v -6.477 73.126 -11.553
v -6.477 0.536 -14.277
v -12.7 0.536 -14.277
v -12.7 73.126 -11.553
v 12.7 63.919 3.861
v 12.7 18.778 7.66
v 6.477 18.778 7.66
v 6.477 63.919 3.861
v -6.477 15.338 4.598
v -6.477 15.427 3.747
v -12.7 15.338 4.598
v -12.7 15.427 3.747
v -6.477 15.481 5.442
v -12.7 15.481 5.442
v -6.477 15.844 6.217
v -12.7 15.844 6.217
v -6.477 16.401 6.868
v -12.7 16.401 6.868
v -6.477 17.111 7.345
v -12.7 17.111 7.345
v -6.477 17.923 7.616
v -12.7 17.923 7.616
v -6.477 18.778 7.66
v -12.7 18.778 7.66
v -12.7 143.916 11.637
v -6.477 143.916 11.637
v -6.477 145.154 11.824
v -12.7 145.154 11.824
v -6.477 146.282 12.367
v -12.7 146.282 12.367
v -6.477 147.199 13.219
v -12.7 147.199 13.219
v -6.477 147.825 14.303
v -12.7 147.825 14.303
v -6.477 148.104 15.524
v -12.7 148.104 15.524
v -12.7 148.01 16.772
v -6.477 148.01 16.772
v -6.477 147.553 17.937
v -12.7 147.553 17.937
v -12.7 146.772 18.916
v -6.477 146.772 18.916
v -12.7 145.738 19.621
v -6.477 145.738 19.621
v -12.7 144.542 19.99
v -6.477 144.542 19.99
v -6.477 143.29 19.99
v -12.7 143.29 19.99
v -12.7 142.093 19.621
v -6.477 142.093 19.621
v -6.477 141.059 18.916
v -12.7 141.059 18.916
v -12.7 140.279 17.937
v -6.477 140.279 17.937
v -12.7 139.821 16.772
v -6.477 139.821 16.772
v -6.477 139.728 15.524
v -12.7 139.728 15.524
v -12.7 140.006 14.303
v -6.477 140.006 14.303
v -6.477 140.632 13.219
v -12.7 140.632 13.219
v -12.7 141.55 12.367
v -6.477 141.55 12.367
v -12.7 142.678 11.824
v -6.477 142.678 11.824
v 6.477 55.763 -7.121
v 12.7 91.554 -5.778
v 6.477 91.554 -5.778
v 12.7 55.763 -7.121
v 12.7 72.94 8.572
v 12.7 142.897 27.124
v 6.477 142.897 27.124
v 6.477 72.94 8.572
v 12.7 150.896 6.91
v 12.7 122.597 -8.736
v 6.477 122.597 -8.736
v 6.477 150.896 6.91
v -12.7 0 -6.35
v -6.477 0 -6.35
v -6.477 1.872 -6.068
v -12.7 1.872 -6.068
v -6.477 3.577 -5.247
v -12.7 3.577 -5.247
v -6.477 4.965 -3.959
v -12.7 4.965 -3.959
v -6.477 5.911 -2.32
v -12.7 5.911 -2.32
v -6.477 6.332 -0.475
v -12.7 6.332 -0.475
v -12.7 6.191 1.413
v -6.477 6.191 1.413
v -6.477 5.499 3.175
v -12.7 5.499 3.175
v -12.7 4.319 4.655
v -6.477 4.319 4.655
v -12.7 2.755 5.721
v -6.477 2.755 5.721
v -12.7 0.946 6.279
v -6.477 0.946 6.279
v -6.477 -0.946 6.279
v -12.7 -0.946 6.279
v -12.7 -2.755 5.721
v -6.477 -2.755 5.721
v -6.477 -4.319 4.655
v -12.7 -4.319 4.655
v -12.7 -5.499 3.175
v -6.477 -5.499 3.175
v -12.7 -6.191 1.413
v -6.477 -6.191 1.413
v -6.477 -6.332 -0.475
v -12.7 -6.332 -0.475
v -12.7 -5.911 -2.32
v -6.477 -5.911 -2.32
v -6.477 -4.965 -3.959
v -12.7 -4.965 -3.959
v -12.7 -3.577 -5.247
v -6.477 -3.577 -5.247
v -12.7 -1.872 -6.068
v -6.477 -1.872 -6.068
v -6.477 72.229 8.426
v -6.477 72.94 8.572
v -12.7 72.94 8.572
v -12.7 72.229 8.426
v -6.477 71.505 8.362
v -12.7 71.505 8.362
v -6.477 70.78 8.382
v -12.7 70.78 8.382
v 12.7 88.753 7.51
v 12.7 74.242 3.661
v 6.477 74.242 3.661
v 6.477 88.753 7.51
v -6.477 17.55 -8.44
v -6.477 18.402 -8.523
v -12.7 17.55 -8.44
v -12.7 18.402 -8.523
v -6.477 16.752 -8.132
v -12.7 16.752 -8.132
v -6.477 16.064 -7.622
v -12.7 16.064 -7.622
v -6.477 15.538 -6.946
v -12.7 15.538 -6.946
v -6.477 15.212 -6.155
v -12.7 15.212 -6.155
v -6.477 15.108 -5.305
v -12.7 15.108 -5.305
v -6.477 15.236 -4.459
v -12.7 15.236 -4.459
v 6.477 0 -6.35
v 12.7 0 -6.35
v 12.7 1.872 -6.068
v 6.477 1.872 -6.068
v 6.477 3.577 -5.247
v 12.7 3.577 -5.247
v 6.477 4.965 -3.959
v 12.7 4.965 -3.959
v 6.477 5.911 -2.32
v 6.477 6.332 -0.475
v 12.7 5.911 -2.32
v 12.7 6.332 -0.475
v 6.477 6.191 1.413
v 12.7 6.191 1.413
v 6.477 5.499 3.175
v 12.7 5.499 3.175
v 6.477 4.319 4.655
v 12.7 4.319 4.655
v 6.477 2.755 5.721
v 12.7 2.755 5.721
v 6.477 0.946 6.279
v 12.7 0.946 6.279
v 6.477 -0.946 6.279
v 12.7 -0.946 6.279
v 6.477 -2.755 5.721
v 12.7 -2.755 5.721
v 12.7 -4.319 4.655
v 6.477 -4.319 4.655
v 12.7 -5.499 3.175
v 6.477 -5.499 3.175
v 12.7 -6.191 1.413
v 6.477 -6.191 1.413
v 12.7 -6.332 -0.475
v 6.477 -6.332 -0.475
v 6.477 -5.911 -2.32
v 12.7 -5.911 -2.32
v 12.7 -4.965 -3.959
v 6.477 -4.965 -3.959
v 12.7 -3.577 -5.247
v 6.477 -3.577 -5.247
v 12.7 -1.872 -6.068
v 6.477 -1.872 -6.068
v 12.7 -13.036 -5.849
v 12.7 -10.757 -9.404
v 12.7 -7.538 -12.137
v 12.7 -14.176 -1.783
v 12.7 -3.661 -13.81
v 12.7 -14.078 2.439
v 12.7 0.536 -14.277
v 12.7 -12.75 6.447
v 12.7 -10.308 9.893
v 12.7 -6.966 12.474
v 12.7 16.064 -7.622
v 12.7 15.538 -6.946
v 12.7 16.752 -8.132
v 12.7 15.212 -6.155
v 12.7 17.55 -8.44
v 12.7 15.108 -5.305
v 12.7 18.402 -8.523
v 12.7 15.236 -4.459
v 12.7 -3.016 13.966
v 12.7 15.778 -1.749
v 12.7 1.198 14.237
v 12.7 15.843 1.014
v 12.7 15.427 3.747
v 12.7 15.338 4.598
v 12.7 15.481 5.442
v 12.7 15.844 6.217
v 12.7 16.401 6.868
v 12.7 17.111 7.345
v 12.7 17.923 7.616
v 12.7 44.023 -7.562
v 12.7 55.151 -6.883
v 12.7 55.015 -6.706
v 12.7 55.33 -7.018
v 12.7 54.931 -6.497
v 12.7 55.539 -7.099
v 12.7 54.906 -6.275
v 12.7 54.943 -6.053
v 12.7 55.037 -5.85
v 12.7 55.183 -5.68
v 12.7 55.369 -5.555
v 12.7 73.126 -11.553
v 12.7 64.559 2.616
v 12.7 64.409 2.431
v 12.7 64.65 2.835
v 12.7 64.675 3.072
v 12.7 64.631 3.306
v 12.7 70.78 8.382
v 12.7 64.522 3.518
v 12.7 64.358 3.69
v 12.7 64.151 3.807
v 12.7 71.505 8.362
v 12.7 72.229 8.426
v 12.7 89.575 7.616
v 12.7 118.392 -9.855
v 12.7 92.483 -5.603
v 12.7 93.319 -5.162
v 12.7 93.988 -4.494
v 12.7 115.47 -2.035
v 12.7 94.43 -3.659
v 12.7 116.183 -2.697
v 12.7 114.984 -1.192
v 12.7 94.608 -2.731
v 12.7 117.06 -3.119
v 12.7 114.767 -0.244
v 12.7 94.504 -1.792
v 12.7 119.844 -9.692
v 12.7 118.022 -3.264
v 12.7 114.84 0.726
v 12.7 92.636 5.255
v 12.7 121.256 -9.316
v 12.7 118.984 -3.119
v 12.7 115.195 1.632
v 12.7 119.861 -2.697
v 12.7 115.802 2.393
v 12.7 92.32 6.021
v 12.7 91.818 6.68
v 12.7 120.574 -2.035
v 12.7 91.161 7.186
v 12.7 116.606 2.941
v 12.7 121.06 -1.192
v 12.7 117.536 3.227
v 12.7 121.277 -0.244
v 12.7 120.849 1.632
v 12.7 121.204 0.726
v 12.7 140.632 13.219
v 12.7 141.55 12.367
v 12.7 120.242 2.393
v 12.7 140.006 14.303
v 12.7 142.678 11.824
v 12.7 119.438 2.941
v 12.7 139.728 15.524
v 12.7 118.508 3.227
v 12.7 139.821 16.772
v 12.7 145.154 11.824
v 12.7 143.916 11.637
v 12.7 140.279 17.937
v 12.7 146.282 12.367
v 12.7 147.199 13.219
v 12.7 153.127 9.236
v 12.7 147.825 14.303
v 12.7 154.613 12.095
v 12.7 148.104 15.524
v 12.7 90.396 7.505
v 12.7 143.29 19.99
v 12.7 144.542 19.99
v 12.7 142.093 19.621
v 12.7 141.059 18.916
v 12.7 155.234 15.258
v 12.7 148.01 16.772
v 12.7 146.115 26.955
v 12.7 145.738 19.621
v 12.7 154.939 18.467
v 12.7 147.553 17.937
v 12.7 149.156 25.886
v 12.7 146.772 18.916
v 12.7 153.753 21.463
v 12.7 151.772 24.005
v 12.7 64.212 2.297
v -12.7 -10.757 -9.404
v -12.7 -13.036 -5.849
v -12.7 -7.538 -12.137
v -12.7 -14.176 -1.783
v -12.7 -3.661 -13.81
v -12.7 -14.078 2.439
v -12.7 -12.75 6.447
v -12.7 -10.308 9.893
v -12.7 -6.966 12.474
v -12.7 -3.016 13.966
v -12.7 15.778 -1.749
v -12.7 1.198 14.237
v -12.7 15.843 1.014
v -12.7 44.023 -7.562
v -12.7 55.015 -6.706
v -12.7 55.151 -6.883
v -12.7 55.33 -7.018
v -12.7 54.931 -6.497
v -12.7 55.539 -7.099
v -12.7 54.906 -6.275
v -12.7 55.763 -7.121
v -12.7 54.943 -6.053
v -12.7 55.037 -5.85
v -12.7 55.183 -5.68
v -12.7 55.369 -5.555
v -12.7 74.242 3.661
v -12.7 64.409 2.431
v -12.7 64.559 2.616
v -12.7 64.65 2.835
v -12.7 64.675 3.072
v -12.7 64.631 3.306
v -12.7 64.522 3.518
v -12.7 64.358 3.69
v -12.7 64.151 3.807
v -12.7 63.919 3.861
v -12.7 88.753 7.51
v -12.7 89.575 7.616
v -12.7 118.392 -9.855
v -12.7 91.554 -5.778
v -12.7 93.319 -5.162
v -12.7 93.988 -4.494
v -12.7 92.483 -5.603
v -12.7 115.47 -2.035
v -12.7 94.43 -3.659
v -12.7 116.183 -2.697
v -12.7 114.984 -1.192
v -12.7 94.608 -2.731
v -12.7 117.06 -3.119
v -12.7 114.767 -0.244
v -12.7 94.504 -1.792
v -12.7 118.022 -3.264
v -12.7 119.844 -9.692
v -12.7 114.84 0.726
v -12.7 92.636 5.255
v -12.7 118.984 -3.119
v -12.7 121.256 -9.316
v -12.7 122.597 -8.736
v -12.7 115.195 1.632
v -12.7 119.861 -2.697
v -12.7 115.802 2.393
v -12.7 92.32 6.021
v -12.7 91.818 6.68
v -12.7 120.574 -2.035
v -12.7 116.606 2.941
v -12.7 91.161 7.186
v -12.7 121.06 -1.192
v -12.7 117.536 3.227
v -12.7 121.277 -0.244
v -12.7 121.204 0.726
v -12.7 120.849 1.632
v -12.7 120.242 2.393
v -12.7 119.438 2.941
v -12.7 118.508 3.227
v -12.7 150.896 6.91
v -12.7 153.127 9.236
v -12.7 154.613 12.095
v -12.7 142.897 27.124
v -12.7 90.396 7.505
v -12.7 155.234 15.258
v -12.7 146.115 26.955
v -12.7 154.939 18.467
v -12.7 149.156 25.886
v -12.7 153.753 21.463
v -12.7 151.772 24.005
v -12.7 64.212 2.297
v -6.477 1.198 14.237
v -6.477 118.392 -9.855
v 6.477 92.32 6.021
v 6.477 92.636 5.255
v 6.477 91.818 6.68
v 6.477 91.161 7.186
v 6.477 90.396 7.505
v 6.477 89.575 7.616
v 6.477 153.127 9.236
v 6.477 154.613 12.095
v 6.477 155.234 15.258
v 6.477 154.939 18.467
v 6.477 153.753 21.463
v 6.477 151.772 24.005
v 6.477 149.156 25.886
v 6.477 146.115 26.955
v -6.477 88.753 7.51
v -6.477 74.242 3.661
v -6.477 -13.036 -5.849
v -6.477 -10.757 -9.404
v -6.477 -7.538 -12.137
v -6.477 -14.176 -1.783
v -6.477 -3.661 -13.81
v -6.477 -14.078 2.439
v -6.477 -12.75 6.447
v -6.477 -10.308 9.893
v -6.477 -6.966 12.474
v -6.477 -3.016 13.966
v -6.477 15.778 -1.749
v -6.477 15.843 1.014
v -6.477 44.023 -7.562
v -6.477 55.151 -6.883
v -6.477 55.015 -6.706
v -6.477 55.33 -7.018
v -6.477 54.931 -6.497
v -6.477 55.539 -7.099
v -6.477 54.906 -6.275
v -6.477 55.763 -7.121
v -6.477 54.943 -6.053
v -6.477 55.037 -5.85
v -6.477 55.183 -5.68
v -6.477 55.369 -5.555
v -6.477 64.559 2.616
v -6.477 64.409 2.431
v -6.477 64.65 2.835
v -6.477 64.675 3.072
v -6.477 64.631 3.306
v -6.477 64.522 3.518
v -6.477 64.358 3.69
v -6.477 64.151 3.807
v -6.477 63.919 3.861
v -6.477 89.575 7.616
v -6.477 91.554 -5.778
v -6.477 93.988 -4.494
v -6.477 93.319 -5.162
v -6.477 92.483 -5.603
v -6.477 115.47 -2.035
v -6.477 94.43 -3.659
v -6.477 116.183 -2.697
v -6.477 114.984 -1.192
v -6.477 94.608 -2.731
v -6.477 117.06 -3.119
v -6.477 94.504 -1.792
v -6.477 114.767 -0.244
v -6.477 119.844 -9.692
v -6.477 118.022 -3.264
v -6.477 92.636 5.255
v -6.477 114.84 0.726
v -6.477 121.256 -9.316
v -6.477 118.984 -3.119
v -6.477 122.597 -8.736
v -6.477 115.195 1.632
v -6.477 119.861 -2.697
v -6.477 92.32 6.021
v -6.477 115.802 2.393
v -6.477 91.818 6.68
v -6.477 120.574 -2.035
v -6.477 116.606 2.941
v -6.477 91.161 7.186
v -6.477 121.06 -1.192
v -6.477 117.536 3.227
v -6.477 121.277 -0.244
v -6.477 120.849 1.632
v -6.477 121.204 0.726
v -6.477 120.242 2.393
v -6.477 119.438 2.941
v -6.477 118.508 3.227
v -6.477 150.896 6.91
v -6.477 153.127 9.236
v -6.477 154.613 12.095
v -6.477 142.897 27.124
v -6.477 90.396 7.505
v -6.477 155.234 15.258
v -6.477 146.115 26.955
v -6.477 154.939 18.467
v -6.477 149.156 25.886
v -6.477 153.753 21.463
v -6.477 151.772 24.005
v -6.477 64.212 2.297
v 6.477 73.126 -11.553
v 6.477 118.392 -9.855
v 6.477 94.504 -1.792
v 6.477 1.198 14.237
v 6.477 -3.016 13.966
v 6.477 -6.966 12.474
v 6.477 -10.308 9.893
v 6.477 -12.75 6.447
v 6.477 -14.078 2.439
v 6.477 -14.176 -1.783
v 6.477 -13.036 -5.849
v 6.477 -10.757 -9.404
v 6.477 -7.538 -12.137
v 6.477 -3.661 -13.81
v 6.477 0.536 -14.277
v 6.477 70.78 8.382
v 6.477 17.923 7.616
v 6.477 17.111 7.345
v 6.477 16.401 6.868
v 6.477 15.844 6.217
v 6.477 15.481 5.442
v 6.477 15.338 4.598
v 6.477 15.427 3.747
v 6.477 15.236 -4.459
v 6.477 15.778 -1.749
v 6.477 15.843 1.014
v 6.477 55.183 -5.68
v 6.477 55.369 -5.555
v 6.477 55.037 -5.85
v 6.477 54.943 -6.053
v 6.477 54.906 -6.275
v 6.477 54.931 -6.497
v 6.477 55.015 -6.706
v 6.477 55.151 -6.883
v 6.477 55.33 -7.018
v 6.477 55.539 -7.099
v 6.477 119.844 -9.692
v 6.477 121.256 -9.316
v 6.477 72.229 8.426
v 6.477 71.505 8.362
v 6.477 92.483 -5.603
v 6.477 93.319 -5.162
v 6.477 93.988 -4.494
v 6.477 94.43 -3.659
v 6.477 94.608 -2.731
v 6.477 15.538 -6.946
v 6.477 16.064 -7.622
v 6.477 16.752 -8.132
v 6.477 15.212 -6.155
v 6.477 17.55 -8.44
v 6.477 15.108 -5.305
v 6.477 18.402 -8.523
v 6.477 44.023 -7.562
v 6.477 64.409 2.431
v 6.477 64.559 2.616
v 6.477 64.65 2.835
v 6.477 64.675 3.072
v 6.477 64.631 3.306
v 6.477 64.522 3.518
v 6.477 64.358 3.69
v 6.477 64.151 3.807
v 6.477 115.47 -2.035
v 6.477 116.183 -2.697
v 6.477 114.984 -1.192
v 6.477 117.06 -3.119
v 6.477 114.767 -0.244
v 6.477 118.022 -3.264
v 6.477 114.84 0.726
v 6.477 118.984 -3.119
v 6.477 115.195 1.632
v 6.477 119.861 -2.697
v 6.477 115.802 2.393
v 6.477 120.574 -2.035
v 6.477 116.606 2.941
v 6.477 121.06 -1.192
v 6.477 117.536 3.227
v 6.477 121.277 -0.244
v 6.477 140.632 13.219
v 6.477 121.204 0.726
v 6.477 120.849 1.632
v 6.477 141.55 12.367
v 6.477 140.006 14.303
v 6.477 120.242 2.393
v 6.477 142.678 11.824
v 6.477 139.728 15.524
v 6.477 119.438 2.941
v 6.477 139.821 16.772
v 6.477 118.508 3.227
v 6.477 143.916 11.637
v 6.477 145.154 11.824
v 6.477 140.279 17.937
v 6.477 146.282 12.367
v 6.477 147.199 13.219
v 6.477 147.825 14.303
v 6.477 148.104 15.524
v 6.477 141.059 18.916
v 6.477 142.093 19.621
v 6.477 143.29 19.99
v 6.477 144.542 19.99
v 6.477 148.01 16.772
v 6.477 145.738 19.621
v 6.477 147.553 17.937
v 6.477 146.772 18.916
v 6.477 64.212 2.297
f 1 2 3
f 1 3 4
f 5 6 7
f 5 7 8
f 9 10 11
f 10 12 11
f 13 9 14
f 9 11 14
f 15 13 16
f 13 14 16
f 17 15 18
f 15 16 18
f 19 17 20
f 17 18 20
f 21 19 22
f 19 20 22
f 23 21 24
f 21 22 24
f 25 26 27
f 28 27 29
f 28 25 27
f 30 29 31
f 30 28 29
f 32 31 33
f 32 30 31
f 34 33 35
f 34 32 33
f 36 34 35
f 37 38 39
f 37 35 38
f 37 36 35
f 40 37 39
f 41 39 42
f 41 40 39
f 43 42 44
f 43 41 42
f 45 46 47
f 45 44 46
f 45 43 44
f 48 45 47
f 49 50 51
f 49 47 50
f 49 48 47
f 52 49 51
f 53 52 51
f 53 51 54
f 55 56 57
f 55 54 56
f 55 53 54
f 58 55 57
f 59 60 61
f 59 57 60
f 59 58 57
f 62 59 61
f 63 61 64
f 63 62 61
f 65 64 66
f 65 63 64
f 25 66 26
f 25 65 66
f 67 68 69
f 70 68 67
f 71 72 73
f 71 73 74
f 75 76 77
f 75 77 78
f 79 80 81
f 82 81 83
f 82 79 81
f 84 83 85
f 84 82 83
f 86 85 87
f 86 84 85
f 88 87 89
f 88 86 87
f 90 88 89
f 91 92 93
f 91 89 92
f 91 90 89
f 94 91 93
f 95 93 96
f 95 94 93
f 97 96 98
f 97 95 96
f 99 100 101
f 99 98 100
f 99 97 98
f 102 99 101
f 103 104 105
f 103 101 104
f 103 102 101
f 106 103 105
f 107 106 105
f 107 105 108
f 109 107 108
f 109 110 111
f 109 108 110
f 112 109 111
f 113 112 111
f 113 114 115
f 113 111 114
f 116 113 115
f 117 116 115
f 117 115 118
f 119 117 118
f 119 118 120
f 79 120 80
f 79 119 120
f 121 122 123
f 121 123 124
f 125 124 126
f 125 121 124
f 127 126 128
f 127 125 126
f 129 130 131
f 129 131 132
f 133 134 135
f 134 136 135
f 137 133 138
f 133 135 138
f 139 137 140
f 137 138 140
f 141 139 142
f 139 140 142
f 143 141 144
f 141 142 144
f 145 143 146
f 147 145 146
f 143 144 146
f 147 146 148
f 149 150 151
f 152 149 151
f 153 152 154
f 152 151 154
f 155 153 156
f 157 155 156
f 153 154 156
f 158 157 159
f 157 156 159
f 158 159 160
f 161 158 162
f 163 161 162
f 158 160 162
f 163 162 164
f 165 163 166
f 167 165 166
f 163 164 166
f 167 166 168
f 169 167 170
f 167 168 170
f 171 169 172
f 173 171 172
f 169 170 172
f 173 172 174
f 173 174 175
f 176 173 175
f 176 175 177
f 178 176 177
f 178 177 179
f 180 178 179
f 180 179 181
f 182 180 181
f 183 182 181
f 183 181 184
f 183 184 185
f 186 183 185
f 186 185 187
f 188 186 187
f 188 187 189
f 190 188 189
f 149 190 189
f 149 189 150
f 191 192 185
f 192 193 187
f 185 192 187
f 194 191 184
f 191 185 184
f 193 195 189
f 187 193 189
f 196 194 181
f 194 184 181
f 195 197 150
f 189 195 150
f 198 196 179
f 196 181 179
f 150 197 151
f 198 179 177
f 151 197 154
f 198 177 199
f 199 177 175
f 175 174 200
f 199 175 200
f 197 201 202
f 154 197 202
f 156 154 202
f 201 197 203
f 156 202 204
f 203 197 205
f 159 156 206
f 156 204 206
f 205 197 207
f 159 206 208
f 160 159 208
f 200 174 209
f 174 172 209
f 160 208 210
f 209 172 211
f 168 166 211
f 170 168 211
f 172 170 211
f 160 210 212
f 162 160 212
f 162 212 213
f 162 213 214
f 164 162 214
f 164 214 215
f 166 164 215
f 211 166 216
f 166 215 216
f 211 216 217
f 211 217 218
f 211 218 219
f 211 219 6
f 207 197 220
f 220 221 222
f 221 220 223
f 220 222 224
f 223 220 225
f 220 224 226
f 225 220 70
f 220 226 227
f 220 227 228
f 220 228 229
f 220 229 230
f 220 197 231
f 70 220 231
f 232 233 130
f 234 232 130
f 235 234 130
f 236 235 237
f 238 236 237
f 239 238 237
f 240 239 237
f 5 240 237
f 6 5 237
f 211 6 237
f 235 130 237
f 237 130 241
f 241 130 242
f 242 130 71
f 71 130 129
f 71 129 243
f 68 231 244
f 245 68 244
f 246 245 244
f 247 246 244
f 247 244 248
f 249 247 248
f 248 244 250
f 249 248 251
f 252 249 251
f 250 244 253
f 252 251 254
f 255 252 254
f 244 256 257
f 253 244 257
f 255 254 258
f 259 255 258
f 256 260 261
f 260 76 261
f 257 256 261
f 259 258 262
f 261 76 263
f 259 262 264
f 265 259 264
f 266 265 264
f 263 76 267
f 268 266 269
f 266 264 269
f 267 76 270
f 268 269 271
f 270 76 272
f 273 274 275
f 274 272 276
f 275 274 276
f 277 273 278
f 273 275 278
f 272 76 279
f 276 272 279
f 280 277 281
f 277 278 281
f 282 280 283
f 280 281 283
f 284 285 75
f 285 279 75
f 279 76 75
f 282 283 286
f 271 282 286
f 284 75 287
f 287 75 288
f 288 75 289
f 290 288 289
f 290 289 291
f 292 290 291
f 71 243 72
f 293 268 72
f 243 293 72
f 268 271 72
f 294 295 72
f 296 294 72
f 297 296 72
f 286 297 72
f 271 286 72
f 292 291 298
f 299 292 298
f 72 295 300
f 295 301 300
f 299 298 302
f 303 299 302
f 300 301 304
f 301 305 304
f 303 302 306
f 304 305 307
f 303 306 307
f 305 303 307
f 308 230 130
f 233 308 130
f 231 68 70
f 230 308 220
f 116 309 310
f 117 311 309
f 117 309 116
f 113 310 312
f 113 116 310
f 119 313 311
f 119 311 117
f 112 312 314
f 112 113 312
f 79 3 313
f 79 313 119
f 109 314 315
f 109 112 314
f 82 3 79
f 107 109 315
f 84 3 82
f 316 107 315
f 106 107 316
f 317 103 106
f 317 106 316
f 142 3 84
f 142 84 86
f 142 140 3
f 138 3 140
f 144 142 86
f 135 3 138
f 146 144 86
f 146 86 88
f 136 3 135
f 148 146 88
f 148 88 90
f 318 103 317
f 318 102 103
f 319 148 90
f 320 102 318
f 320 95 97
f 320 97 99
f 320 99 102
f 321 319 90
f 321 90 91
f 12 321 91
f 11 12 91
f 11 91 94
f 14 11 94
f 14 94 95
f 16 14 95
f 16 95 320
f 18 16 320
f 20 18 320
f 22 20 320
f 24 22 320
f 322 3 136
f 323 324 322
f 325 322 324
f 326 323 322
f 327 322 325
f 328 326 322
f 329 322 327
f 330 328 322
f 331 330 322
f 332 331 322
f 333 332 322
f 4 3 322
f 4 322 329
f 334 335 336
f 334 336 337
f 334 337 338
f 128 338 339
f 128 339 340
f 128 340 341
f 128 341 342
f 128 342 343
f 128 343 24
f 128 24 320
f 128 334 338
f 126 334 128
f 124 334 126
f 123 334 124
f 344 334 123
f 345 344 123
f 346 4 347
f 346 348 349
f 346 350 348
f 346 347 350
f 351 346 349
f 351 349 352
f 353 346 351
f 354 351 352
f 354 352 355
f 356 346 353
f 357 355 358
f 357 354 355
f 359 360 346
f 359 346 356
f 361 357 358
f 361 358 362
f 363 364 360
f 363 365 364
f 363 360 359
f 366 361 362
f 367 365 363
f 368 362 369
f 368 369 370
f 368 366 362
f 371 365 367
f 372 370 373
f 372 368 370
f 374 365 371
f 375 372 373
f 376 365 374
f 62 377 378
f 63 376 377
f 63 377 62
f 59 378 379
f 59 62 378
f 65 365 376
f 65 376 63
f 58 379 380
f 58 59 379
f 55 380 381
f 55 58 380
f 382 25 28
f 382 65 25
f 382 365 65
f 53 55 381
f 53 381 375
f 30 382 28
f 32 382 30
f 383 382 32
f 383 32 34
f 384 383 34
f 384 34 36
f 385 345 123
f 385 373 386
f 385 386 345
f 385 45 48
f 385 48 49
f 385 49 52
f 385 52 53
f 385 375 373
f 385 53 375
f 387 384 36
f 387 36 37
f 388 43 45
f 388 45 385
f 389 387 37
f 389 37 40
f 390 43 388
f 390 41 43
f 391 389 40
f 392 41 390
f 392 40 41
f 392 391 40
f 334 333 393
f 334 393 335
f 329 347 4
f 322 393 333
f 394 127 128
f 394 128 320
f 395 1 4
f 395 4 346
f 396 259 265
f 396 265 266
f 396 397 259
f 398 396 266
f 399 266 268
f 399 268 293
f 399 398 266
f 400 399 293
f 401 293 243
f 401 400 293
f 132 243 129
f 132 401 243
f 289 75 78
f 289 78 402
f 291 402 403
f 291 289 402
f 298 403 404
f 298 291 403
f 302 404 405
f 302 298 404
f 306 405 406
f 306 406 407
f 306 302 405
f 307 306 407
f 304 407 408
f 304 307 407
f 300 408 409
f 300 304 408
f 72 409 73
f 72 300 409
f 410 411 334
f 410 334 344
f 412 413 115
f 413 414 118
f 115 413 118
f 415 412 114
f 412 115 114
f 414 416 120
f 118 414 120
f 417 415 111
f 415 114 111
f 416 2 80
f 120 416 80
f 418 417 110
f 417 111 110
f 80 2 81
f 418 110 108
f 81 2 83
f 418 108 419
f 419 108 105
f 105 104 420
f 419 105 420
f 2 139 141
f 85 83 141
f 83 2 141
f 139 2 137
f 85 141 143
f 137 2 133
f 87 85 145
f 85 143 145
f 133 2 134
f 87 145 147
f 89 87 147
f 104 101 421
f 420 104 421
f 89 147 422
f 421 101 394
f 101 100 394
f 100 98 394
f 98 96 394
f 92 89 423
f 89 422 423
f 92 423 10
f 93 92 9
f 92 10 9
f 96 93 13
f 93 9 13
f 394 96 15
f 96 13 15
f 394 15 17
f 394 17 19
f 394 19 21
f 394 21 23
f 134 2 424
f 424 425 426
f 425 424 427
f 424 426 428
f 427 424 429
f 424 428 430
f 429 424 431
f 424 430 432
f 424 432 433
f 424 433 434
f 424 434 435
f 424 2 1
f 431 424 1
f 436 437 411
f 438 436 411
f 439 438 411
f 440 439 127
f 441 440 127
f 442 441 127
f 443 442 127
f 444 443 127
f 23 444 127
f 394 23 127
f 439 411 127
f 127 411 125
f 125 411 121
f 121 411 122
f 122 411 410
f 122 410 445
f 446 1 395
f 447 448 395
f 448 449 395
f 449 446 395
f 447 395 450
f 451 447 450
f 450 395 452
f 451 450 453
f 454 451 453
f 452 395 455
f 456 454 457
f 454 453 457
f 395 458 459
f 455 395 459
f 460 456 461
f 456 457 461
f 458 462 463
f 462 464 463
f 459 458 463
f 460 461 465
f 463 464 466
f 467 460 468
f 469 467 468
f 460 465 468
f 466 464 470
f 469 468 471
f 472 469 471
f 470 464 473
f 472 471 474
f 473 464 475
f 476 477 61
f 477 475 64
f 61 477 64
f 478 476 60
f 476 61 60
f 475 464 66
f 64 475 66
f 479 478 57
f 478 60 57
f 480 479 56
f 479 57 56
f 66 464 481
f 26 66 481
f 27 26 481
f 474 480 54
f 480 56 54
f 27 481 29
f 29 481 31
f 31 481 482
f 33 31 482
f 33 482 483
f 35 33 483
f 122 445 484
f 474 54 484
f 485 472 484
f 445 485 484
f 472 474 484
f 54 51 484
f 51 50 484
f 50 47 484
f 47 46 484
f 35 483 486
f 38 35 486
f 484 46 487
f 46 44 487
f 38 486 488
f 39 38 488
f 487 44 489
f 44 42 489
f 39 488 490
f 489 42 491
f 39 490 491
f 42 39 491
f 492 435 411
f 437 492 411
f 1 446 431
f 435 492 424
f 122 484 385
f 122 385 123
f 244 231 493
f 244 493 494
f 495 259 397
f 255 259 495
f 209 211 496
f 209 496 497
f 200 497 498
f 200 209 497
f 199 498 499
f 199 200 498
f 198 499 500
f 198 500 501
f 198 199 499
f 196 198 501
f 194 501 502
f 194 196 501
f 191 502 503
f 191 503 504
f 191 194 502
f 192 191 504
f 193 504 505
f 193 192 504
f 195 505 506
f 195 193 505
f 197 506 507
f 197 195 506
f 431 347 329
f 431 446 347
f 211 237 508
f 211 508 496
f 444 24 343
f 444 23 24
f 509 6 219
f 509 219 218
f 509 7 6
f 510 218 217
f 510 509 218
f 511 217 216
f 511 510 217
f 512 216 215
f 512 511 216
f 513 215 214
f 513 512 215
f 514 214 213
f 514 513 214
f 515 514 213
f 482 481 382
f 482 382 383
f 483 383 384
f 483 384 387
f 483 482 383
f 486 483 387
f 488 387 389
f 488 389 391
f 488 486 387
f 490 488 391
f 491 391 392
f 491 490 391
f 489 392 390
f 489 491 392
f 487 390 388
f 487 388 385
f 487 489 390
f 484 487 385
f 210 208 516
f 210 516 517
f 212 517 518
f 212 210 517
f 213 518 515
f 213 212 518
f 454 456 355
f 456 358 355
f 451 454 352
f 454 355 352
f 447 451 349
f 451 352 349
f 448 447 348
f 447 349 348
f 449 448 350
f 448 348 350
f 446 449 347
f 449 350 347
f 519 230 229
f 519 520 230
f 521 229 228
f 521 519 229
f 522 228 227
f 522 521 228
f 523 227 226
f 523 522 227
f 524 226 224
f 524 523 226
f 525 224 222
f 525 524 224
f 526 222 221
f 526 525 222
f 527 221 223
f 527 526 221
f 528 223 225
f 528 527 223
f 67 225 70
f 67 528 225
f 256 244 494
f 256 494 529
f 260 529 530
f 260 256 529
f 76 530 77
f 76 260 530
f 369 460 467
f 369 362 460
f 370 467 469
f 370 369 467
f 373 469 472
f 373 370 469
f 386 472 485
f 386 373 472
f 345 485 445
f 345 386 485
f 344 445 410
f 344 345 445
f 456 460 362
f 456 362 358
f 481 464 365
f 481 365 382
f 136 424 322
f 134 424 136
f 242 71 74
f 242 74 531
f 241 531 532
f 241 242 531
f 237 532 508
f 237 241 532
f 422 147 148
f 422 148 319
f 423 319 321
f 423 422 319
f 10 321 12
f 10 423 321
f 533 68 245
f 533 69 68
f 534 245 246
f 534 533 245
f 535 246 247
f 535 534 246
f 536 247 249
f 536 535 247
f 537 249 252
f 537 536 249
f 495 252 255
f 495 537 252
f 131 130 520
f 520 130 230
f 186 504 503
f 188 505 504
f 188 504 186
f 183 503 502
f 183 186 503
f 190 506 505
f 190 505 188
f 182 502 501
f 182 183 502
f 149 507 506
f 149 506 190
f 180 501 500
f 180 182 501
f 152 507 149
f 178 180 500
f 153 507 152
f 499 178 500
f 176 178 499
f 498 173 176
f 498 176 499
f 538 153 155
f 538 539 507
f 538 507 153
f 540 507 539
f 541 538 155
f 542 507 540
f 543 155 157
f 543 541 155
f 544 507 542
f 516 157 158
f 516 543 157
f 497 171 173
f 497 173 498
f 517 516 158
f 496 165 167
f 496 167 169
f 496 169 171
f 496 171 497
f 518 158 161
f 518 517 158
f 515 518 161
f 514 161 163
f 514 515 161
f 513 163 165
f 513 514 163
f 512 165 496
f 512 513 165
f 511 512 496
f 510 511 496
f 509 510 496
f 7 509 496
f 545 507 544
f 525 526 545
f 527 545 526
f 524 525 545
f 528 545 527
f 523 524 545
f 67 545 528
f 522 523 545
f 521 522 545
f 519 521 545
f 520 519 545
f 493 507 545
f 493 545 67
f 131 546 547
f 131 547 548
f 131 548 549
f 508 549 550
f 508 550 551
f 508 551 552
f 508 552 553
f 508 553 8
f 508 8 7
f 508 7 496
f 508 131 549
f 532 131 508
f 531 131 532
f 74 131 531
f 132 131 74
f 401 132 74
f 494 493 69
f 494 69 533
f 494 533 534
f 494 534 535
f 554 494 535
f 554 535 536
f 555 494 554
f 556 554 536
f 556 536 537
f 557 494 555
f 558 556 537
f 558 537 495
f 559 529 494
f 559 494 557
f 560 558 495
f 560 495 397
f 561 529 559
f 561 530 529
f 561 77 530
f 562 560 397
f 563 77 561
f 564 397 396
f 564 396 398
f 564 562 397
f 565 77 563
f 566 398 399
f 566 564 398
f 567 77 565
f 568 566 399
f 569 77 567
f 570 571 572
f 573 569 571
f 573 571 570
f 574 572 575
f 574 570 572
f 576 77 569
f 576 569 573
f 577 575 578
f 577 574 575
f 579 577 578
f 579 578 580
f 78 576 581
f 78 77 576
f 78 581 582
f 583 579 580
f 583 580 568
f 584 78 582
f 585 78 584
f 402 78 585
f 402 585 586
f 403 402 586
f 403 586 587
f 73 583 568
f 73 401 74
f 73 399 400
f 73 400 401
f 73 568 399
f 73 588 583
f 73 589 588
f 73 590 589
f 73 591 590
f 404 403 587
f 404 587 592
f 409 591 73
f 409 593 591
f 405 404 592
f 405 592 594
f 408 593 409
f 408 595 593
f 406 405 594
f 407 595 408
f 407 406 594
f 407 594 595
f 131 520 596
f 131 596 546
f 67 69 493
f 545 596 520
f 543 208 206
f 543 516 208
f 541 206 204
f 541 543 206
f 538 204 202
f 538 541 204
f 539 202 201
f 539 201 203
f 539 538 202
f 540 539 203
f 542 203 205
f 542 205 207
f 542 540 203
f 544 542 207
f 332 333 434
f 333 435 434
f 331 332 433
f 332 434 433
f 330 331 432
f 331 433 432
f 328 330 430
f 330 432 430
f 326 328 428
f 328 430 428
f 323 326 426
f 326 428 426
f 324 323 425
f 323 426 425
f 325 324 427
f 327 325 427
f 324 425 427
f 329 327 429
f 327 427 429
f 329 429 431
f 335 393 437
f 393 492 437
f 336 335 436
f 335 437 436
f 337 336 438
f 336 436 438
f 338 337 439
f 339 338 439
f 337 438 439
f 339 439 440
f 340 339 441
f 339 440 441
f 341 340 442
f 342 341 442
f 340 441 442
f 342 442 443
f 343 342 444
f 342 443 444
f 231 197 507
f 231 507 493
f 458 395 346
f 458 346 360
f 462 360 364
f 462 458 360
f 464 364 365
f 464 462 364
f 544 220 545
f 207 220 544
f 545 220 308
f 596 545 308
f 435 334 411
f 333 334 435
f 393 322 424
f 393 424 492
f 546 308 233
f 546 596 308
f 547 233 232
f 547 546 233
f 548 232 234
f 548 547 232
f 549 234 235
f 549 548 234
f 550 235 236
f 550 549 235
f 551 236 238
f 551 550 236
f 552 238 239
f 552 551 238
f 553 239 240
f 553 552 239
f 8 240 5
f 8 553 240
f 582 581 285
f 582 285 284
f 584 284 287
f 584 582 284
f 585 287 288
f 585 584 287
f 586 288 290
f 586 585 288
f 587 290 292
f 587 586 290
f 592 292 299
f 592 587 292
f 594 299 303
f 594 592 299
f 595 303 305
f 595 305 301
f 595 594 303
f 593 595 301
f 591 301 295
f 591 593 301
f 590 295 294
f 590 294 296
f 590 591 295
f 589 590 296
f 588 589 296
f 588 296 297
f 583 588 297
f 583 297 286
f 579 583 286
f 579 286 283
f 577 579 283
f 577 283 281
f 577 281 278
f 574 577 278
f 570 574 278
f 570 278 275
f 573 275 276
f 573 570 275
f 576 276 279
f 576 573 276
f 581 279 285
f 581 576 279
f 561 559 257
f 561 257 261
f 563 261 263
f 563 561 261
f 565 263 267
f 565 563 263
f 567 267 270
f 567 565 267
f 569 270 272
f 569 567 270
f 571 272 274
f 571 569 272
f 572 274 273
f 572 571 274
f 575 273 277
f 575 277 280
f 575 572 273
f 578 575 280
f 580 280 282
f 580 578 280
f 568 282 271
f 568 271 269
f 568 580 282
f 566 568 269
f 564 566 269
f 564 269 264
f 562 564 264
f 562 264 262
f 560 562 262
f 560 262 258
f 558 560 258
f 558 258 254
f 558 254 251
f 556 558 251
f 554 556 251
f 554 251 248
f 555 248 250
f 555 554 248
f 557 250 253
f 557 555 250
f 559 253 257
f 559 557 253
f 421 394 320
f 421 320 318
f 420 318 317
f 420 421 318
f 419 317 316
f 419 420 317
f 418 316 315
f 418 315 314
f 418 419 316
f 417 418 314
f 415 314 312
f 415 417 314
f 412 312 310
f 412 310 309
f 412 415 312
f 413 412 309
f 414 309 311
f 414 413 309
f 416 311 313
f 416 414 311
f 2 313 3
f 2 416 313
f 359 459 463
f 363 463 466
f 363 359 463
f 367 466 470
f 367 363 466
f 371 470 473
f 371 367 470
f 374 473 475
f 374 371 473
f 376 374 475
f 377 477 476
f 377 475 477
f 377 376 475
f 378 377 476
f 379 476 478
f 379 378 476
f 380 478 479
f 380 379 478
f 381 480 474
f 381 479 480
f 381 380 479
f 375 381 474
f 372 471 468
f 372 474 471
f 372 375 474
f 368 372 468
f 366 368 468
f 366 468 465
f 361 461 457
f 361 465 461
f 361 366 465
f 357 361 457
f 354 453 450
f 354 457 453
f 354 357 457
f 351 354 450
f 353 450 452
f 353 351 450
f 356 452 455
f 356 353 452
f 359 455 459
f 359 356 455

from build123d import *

# Parameters (mm, degrees)
SKETCH6_R           = 3.2639
SKETCH6_R_2         = 4.19989
BOSS_EXTRUDE3_DEPTH = 12.7
SKETCH7_R           = 6.35
CUT_EXTRUDE1_DEPTH  = 7.14375
SKETCH8_R           = 7.9375
CUT_EXTRUDE2_DEPTH  = 5.55625
CUT_EXTRUDE3_DEPTH  = 29.21
CUT_EXTRUDE5_DEPTH  = 25.4
FILLET2_R           = 3.175
FILLET3_R           = 3.175
BOSS_EXTRUDE4_DEPTH = 6.223
FILLET4_R           = 0.8255
BOSS_EXTRUDE5_DEPTH = 6.223
FILLET6_R           = 0.8255


with BuildPart() as part:
    # Sketch6 → Boss-Extrude3 (new, symmetric)
    with BuildSketch(Plane(origin=(0, 0, 0), x_dir=(0, 0, -1), z_dir=(1, 0, 0))):
        with BuildLine():
            Line((-8.381868112, 70.779690611), (-14.237180291, 1.198062439))
            ThreePointArc((-14.237180291, 1.198062439), (-0.331752192, -14.283647879), (14.277450567, 0.53578125))
            Line((14.277450567, 0.53578125), (11.553393182, 73.126217476))
            Line((11.553393182, 73.126217476), (9.854739755, 118.39178125))
            ThreePointArc((9.854739755, 118.39178125), (9.530289118, 120.556972634), (8.73611616, 122.597220477))
            Line((8.73611616, 122.597220477), (-6.910022509, 150.896463863))
            ThreePointArc((-6.910022509, 150.896463863), (-20.007377725, 154.453271456), (-27.124133067, 142.897174048))
            Line((-27.124133067, 142.897174048), (-8.571671953, 72.939897507))
            ThreePointArc((-8.571671953, 72.939897507), (-8.383873897, 71.86795626), (-8.381868112, 70.779690611))
        make_face()
        with Locations((0, 118.021968393)):
            Circle(SKETCH6_R, mode=Mode.SUBTRACT)
        with Locations((-15.837385813, 143.915751317)):
            Circle(SKETCH6_R_2, mode=Mode.SUBTRACT)
    extrude(amount=BOSS_EXTRUDE3_DEPTH, both=True)

    # Sketch7 → Cut-Extrude1 (cut)
    with BuildSketch(Plane(origin=(12.7, 0, 0), x_dir=(0, 0, -1), z_dir=(1, 0, 0))):
        Circle(SKETCH7_R)
    cut_extrude1 = extrude(amount=-CUT_EXTRUDE1_DEPTH, mode=Mode.SUBTRACT)

    # Sketch8 → Cut-Extrude2 (cut)
    with BuildSketch(Plane(origin=(5.55625, 0, 0), x_dir=(0, 0, -1), z_dir=(1, 0, 0))):
        Circle(SKETCH8_R)
    cut_extrude2 = extrude(amount=-CUT_EXTRUDE2_DEPTH, mode=Mode.SUBTRACT)

    # Mirror1: Cut-Extrude2 across plane
    add(cut_extrude2.mirror(Plane(origin=(0, 0, 0), x_dir=(0, 0, 1), z_dir=(1, 0, 0))), mode=Mode.SUBTRACT)

    # Mirror2: Cut-Extrude1 across plane
    add(cut_extrude1.mirror(Plane(origin=(0, 0, 0), x_dir=(0, 0, 1), z_dir=(1, 0, 0))), mode=Mode.SUBTRACT)

    # Sketch10 → Cut-Extrude3 (cut, symmetric)
    with BuildSketch(Plane(origin=(0, 0, 14.237180291), x_dir=(-1, 0, 0), z_dir=(0, 0, -1))):
        with BuildLine():
            Line((-6.477, 155.976463863), (-6.477, -18.648536137))
            ThreePointArc((-6.477, -18.648536137), (-5.54706403, -20.893600167), (-3.302, -21.823536137))
            Line((-3.302, -21.823536137), (3.302, -21.823536137))
            ThreePointArc((3.302, -21.823536137), (5.54706403, -20.893600167), (6.477, -18.648536137))
            Line((6.477, -18.648536137), (6.477, 155.976463863))
            Line((6.477, 155.976463863), (-6.477, 155.976463863))
        make_face()
    extrude(amount=CUT_EXTRUDE3_DEPTH, both=True, mode=Mode.SUBTRACT)


with BuildPart() as cut_extrude3_piece_1:
    # of the separate pieces the step leaves, piece 1, a body of its own (cut_extrude3_pieces)
    add(part.part.solids().sort_by_distance((-6.477, 142.897174048, 27.124133067))[0])


with BuildPart() as cut_extrude3_piece_2:
    # of the separate pieces the step leaves, piece 2, a body of its own (cut_extrude3_pieces)
    add(part.part.solids().sort_by_distance((12.7, 142.897174048, 27.124133067))[0])


with BuildPart() as cut_extrude5_tool:
    # Sketch13 → Cut-Extrude5 (new body)
    with BuildSketch(Plane(origin=(12.7, 0, 0), x_dir=(0, 0, -1), z_dir=(1, 0, 0))):
        with BuildLine():
            Line((-3.661406478, 74.242085268), (-8.323485823, 91.821767662))
            Line((-8.323485823, 91.821767662), (5.62938354, 95.522027008))
            Line((5.62938354, 95.522027008), (8.716072329, 13.26822174))
            ThreePointArc((8.716072329, 13.26822174), (0.368613547, 15.870719866), (-8.090670188, 13.658575362))
            Line((-8.090670188, 13.658575362), (-3.319759564, 70.353712855))
            ThreePointArc((-3.319759564, 70.353712855), (-3.323369976, 72.312591024), (-3.661406478, 74.242085268))
        make_face()
    extrude(amount=-CUT_EXTRUDE5_DEPTH)


with BuildPart() as cut_extrude3_piece_1_1:
    add(cut_extrude3_piece_1.part)

    # Cut-Extrude5: cut by cut_extrude5_tool
    add(cut_extrude5_tool.part, mode=Mode.SUBTRACT)

    # Fillet2
    fillet2_edges = [cut_extrude3_piece_1_1.edges().sort_by_distance(p)[0] for p in [
        (-9.5885, 91.821767662, 8.323485823),
        (-9.5885, 95.522027008, -5.62938354),
        (-9.5885, 13.26822174, -8.716072329),
        (-9.5885, 13.658575362, 8.090670188),
    ]]
    fillet(fillet2_edges, radius=FILLET2_R)

    # Sketch23 → Boss-Extrude5 (add)
    with BuildSketch(Plane(origin=(-12.7, 0, -12.7), x_dir=(0, 0, -1), z_dir=(1, 0, 0))):
        with BuildLine():
            Line((-16.361406478, 74.242085268), (-5.432185966, 51.861278542))
            Line((-5.432185966, 51.861278542), (-5.138058737, 44.023402597))
            Line((-5.138058737, 44.023402597), (-16.310243165, 66.901749696))
            Line((-16.310243165, 66.901749696), (-16.019759564, 70.353712855))
            ThreePointArc((-16.019759564, 70.353712855), (-16.023369976, 72.312591024), (-16.361406478, 74.242085268))
        make_face()
    extrude(amount=BOSS_EXTRUDE5_DEPTH)

    # Fillet6
    fillet6_edges = [cut_extrude3_piece_1_1.edges().sort_by_distance(p)[0] for p in [
        (-9.5885, 66.901749696, 3.610243165),
        (-9.5885, 51.861278542, -7.267814034),
    ]]
    fillet(fillet6_edges, radius=FILLET6_R)


with BuildPart() as cut_extrude3_piece_2_1:
    add(cut_extrude3_piece_2.part)

    # Cut-Extrude5: cut by cut_extrude5_tool
    add(cut_extrude5_tool.part, mode=Mode.SUBTRACT)

    # Fillet3
    fillet3_edges = [cut_extrude3_piece_2_1.edges().sort_by_distance(p)[0] for p in [
        (9.5885, 91.821767662, 8.323485823),
        (9.5885, 95.522027008, -5.62938354),
        (9.5885, 13.26822174, -8.716072329),
        (9.5885, 13.658575362, 8.090670188),
    ]]
    fillet(fillet3_edges, radius=FILLET3_R)

    # Sketch21 → Boss-Extrude4 (add)
    with BuildSketch(Plane(origin=(12.7, 0, 0), x_dir=(0, 0, -1), z_dir=(1, 0, 0))):
        with BuildLine():
            Line((-3.661406478, 74.242085268), (7.267814034, 51.861278542))
            Line((7.267814034, 51.861278542), (7.561941263, 44.023402597))
            Line((7.561941263, 44.023402597), (-3.610243165, 66.901749696))
            Line((-3.610243165, 66.901749696), (-3.319759564, 70.353712855))
            ThreePointArc((-3.319759564, 70.353712855), (-3.323369976, 72.312591024), (-3.661406478, 74.242085268))
        make_face()
    extrude(amount=-BOSS_EXTRUDE4_DEPTH)

    # Fillet4
    fillet4_edges = [cut_extrude3_piece_2_1.edges().sort_by_distance(p)[0] for p in [
        (9.5885, 66.901749696, 3.610243165),
        (9.5885, 51.861278542, -7.267814034),
    ]]
    fillet(fillet4_edges, radius=FILLET4_R)


solid = Compound([cut_extrude3_piece_1_1.part, cut_extrude3_piece_2_1.part])
